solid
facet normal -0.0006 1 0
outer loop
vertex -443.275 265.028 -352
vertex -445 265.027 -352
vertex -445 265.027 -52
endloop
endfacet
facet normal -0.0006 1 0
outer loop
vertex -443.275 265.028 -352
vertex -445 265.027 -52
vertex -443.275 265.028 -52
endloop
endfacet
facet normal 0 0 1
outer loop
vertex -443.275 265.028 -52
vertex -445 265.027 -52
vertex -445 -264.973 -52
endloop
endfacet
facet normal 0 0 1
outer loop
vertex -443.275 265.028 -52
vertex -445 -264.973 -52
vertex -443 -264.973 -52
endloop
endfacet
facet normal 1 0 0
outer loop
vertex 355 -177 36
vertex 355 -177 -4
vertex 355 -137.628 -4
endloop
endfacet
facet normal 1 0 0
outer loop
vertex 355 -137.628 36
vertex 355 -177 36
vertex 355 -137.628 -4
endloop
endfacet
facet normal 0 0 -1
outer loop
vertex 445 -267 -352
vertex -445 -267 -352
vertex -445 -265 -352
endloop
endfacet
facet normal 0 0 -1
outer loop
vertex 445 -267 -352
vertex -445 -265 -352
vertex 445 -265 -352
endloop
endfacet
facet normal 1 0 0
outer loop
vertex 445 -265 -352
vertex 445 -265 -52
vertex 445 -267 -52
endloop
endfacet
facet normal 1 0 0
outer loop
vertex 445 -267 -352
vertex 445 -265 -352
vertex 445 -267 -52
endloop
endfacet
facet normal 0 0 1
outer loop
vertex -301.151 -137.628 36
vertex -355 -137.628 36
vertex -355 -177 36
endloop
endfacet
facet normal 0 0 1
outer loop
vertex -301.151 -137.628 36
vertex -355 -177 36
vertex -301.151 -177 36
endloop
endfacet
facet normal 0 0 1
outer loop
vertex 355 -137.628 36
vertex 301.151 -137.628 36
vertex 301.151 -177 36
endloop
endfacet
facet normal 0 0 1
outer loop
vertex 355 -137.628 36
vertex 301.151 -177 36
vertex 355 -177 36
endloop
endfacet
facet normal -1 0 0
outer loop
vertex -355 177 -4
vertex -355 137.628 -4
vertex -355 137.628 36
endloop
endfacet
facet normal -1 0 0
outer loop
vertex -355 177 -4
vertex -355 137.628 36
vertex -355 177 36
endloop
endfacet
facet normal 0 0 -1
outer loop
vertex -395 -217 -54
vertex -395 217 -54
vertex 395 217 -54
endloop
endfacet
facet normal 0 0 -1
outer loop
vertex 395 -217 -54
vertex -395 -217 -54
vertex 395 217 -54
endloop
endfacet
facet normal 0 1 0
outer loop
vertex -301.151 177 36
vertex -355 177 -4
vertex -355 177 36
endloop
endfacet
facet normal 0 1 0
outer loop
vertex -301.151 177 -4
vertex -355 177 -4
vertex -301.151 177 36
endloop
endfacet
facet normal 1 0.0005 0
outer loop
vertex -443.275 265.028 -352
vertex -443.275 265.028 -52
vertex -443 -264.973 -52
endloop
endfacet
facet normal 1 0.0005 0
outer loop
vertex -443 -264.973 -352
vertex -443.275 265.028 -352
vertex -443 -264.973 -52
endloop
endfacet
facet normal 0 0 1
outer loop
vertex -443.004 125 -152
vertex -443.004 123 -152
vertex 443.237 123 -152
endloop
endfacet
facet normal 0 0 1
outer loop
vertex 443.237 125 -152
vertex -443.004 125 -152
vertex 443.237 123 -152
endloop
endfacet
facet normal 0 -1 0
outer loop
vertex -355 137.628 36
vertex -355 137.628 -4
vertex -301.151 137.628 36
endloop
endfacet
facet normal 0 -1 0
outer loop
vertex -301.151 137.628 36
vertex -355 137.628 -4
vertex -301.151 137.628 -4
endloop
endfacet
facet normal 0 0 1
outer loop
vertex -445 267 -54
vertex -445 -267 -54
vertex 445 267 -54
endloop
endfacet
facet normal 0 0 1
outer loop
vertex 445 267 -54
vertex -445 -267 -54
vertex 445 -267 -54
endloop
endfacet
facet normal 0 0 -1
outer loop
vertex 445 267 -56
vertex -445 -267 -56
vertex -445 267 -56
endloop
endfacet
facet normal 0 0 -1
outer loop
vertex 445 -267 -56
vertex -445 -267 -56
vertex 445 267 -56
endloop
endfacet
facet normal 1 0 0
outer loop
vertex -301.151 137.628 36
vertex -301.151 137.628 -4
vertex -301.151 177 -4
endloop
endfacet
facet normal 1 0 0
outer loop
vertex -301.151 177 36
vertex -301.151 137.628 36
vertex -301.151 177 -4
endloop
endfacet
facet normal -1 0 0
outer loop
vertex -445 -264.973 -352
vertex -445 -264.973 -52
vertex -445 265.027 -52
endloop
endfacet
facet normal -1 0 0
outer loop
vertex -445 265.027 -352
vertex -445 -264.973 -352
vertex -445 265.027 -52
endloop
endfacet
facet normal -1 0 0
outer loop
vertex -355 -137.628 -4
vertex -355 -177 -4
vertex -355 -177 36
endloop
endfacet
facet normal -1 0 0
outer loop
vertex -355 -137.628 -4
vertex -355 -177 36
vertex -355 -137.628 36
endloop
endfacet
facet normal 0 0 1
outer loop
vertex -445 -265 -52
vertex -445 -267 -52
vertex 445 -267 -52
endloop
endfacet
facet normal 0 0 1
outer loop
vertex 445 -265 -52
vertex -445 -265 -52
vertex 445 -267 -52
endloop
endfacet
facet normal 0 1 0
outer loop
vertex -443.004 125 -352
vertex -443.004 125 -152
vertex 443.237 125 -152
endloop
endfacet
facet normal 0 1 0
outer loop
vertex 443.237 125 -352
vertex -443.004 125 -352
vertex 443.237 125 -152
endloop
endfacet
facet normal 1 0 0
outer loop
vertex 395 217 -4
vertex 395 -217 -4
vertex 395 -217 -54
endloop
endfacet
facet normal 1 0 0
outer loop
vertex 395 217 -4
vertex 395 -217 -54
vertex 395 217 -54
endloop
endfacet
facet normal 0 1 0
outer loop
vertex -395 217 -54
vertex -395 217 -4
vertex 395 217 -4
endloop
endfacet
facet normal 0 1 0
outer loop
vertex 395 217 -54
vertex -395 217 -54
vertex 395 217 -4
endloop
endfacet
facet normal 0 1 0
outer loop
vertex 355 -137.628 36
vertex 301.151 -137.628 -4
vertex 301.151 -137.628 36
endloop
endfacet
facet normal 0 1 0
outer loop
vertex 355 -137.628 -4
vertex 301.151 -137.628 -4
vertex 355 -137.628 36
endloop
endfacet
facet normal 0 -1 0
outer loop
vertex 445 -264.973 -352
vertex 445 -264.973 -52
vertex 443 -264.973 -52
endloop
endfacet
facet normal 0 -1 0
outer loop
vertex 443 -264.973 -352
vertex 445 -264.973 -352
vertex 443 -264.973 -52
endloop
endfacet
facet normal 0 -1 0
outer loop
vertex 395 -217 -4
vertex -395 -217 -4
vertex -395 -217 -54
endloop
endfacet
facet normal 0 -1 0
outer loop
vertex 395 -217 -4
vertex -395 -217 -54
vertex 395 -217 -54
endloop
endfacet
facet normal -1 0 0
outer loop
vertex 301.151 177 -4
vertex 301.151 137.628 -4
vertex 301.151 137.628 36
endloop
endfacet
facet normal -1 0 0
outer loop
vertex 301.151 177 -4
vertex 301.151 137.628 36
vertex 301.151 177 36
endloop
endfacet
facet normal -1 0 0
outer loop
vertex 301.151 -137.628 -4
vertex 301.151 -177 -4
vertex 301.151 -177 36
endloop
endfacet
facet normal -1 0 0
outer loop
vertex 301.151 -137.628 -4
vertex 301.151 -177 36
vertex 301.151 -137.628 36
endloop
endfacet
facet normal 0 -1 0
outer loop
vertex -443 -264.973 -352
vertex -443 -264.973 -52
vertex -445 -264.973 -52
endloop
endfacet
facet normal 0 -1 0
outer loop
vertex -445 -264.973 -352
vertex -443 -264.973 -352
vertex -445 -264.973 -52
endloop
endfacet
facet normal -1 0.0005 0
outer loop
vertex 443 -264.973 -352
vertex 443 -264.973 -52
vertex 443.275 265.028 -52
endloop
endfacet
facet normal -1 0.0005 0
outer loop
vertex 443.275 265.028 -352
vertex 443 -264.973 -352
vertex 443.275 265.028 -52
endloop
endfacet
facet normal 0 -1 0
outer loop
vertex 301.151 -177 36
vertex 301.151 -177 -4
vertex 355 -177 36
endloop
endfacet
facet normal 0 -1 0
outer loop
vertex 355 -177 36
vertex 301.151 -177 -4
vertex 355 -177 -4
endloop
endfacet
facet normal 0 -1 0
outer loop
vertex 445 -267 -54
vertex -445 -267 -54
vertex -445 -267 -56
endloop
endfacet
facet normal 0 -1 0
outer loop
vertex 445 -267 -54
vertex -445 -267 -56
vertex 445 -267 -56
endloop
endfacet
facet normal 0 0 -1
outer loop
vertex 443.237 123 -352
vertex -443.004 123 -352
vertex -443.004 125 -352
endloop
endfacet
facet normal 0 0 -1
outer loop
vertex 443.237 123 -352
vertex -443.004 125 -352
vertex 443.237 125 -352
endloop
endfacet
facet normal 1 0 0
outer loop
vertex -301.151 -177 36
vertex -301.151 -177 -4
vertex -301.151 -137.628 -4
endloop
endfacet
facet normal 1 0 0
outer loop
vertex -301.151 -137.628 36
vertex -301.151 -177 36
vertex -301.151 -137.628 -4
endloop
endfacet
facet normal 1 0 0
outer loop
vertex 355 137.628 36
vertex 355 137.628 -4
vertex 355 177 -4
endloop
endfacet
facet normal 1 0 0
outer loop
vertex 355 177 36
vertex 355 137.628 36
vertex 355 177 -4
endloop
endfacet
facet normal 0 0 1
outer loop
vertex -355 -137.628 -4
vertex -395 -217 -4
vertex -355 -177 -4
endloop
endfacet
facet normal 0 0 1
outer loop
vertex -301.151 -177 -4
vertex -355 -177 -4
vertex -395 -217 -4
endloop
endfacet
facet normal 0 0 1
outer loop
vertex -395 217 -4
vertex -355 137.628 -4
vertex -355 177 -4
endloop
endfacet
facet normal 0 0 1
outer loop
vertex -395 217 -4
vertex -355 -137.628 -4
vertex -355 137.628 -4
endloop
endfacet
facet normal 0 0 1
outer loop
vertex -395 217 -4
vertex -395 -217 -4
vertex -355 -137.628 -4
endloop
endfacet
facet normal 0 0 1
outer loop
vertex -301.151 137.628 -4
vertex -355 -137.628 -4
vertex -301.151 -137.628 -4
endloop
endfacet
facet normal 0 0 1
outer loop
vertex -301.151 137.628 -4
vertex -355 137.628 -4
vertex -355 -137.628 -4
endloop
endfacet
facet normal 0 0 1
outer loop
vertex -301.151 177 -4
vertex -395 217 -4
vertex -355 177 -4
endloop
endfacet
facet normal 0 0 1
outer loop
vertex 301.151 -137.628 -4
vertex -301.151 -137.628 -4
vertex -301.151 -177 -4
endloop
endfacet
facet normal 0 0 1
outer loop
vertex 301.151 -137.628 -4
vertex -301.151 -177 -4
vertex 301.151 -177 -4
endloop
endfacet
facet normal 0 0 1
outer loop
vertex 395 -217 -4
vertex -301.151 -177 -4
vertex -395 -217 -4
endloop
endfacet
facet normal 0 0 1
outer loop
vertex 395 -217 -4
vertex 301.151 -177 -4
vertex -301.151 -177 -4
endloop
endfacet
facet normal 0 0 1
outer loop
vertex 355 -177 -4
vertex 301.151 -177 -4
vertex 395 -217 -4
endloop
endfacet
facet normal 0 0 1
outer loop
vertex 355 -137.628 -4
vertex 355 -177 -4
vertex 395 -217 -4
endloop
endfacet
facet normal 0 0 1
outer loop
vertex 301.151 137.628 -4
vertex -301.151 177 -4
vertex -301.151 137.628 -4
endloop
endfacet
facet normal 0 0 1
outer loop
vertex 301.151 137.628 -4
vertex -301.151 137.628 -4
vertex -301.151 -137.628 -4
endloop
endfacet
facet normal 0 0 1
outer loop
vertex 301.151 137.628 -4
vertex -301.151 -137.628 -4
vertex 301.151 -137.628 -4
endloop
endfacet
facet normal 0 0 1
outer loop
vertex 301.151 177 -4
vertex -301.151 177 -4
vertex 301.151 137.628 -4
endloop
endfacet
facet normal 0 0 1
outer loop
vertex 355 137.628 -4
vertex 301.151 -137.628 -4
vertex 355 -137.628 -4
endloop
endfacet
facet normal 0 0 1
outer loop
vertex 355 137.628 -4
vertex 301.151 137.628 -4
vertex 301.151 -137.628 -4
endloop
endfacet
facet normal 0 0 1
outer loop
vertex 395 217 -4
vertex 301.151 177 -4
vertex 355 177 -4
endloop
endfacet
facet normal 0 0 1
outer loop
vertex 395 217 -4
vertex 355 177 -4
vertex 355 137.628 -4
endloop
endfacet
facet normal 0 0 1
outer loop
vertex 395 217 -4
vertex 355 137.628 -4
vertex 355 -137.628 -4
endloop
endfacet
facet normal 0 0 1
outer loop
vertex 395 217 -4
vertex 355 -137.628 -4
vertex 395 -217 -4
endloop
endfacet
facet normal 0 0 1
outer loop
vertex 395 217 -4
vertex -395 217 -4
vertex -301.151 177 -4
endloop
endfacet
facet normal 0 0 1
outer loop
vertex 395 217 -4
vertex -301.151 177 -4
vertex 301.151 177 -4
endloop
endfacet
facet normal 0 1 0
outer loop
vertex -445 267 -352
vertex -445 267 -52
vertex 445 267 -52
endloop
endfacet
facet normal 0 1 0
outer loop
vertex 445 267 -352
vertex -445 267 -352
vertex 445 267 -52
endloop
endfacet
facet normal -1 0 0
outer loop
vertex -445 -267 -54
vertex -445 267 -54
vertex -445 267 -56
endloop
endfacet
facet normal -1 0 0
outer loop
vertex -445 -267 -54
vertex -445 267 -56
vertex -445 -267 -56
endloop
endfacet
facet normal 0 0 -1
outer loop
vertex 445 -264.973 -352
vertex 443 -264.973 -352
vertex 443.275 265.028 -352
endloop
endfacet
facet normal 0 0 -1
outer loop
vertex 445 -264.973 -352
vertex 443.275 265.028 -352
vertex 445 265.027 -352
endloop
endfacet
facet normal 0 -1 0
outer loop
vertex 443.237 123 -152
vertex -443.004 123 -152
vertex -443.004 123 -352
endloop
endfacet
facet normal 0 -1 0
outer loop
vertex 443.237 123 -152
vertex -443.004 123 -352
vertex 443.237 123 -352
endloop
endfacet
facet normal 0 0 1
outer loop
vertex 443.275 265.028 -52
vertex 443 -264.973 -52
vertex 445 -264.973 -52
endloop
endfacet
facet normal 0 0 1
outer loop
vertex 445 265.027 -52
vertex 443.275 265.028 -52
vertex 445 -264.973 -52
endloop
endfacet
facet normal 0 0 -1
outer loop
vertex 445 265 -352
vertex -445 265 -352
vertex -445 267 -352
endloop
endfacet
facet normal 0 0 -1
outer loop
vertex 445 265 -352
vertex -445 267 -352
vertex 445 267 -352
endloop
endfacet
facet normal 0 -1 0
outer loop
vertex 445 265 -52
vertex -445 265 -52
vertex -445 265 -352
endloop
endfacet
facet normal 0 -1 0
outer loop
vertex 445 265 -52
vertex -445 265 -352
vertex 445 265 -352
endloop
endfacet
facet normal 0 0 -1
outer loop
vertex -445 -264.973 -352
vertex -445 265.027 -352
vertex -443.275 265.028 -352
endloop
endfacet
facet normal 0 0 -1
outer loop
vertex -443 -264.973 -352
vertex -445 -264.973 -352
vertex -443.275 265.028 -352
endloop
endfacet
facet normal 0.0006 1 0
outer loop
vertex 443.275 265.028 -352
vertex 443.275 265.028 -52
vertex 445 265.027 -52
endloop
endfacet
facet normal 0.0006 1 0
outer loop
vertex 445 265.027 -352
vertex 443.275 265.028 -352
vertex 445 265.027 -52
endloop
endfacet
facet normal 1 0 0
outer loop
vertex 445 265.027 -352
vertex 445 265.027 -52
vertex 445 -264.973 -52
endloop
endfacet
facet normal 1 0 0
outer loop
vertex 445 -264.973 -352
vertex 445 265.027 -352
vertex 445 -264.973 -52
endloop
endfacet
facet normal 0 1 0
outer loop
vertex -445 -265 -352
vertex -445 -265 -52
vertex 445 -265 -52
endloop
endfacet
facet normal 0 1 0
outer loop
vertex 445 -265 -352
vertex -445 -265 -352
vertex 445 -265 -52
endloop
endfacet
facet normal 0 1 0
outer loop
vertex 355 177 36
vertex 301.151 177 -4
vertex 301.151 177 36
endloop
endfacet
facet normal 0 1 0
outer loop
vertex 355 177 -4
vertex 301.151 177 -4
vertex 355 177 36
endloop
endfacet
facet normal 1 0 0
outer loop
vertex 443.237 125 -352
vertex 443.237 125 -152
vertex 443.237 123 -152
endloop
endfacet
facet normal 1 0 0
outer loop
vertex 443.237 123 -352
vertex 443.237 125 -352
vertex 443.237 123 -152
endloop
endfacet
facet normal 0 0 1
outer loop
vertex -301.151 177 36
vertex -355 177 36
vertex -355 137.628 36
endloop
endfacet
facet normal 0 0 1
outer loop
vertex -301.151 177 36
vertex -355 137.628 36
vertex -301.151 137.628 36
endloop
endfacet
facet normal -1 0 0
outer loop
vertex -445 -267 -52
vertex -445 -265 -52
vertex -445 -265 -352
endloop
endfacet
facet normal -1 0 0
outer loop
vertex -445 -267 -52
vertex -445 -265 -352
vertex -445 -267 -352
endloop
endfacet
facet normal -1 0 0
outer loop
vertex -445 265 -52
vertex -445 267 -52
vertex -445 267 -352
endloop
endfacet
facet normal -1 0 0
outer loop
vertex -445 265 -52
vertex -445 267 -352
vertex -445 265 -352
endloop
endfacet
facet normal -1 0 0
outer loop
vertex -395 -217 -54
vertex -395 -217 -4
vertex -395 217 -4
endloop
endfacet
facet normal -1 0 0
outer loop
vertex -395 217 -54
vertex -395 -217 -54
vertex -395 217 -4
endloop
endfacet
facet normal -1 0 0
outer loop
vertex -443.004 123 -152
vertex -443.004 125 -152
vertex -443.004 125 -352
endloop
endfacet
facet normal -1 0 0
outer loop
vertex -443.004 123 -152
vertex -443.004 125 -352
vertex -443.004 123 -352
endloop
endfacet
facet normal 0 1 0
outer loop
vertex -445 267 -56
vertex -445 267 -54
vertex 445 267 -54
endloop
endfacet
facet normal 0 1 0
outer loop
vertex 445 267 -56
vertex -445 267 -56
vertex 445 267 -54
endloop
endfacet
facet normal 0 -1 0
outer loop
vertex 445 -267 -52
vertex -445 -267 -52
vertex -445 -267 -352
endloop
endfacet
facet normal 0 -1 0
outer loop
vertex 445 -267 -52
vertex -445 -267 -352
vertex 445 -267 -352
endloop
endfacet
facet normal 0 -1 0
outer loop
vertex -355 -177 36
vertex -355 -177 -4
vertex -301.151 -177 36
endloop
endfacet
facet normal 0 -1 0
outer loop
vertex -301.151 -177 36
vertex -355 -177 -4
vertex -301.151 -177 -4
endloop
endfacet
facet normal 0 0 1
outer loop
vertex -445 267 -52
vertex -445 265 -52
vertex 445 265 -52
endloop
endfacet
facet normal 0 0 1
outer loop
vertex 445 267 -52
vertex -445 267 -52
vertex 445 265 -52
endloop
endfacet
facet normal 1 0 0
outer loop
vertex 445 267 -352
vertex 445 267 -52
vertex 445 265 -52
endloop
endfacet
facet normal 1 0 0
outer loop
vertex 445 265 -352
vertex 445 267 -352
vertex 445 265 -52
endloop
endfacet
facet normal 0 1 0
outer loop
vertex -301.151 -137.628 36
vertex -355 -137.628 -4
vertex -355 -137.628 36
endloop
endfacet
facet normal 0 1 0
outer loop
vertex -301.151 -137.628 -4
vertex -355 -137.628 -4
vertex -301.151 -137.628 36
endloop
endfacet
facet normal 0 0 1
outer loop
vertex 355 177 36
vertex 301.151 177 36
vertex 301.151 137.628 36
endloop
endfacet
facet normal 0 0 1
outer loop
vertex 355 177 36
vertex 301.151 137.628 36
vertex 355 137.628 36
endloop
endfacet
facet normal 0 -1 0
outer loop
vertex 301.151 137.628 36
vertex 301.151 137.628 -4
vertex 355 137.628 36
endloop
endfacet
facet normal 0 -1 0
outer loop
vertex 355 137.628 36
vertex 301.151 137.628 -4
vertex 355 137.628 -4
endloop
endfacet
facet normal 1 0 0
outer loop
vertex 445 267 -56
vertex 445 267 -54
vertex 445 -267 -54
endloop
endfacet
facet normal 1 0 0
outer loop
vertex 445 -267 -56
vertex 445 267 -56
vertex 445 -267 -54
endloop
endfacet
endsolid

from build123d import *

# Parameters (mm, degrees)
F0_W      = 790
F0_H      = 434
F1_DEPTH  = 50
F2_W      = 890
F2_H      = 534
F3_DEPTH  = 2
F4_W      = 890
F4_H      = 2
F5_DEPTH  = 300
F6_W      = 890
F6_H      = 2
F7_DEPTH  = 300
F9_DEPTH  = 300
F10_W     = 886.24073763
F10_H     = 2
F11_DEPTH = 200
F14_W     = 53.8489925209
F14_H     = 39.3722521436
F15_DEPTH = 40


# Not quite as in the source:
# - the program builds the solid bodies; features that only make, move or delete a surface that nothing else refers to are left out


with BuildPart() as f1:
    # F0 (on Top) → F1 (new body)
    with BuildSketch(Plane.XY):
        Rectangle(F0_W, F0_H)
    extrude(amount=-F1_DEPTH)


with BuildPart() as f3:
    # F2 (on face) → F3 (new body)
    with BuildSketch(Plane(origin=(0, 0, -50), x_dir=(1, 0, 0), z_dir=(0, 0, -1))):
        Rectangle(F2_W, F2_H)
    extrude(amount=F3_DEPTH)


with BuildPart() as f5:
    # F4 (on face) → F5 (new body)
    with BuildSketch(Plane(origin=(0, 0, -52), x_dir=(1, 0, 0), z_dir=(0, 0, -1))):
        with Locations((0, 266)):
            Rectangle(F4_W, F4_H)
    extrude(amount=F5_DEPTH)


with BuildPart() as f7:
    # F6 (on face) → F7 (new body)
    with BuildSketch(Plane(origin=(0, 0, -52), x_dir=(1, 0, 0), z_dir=(0, 0, -1))):
        with Locations((0, -266)):
            Rectangle(F6_W, F6_H)
    extrude(amount=F7_DEPTH)


with BuildPart() as f9:
    # F8 (on face) → F9 (new body)
    with BuildSketch(Plane(origin=(0, 0, -52), x_dir=(1, 0, 0), z_dir=(0, 0, -1))):
        Polygon((-443, 264.9729303838), (-445, 264.9729303838), (-445, -265.0270696162), (-443.2746438212, -265.0279636871), align=None)
    extrude(amount=F9_DEPTH)


with BuildPart() as f9b:
    # F8 (on face) → F9, piece 2 (new body)
    with BuildSketch(Plane(origin=(0, 0, -52), x_dir=(1, 0, 0), z_dir=(0, 0, -1))):
        Polygon((445, -265.0270696162), (445, 264.9729303838), (443, 264.9729303838), (443.2746438214, -265.0279636871), align=None)
    extrude(amount=F9_DEPTH)


with BuildPart() as f11:
    # F10 (on face) → F11 (new body)
    with BuildSketch(Plane(origin=(0, 0, -52), x_dir=(1, 0, 0), z_dir=(0, 0, -1))):
        with Locations((0.1168335443, -124)):
            Rectangle(F10_W, F10_H)
    extrude(amount=F11_DEPTH)


with BuildPart() as f11_1:
    # F12: moved
    add(f11.part.moved(Location((0, 0, -96))))


with BuildPart() as f11_2:
    # F13: moved
    add(f11_1.part.moved(Location((0, 0, -4))))


with BuildPart() as f3_1:
    # F13: moved
    add(f3.part.moved(Location((0, 0, -4))))


with BuildPart() as f1_1:
    # F13: moved
    add(f1.part.moved(Location((0, 0, -4))))

    # F14 (on face) → F15 (join)
    with BuildSketch(Plane.XY.offset(-4)):
        with Locations((328.0755037396, 157.3138739282)):
            Rectangle(F14_W, F14_H)
        with Locations((-328.0755037396, -157.3138739282)):
            Rectangle(F14_W, F14_H)
        with Locations((328.0755037396, -157.3138739282)):
            Rectangle(F14_W, F14_H)
        with Locations((-328.0755037396, 157.3138739282)):
            Rectangle(F14_W, F14_H)
    extrude(amount=F15_DEPTH)


solid = Compound([f5.part, f7.part, f9.part, f9b.part, f11_2.part, f3_1.part, f1_1.part])
